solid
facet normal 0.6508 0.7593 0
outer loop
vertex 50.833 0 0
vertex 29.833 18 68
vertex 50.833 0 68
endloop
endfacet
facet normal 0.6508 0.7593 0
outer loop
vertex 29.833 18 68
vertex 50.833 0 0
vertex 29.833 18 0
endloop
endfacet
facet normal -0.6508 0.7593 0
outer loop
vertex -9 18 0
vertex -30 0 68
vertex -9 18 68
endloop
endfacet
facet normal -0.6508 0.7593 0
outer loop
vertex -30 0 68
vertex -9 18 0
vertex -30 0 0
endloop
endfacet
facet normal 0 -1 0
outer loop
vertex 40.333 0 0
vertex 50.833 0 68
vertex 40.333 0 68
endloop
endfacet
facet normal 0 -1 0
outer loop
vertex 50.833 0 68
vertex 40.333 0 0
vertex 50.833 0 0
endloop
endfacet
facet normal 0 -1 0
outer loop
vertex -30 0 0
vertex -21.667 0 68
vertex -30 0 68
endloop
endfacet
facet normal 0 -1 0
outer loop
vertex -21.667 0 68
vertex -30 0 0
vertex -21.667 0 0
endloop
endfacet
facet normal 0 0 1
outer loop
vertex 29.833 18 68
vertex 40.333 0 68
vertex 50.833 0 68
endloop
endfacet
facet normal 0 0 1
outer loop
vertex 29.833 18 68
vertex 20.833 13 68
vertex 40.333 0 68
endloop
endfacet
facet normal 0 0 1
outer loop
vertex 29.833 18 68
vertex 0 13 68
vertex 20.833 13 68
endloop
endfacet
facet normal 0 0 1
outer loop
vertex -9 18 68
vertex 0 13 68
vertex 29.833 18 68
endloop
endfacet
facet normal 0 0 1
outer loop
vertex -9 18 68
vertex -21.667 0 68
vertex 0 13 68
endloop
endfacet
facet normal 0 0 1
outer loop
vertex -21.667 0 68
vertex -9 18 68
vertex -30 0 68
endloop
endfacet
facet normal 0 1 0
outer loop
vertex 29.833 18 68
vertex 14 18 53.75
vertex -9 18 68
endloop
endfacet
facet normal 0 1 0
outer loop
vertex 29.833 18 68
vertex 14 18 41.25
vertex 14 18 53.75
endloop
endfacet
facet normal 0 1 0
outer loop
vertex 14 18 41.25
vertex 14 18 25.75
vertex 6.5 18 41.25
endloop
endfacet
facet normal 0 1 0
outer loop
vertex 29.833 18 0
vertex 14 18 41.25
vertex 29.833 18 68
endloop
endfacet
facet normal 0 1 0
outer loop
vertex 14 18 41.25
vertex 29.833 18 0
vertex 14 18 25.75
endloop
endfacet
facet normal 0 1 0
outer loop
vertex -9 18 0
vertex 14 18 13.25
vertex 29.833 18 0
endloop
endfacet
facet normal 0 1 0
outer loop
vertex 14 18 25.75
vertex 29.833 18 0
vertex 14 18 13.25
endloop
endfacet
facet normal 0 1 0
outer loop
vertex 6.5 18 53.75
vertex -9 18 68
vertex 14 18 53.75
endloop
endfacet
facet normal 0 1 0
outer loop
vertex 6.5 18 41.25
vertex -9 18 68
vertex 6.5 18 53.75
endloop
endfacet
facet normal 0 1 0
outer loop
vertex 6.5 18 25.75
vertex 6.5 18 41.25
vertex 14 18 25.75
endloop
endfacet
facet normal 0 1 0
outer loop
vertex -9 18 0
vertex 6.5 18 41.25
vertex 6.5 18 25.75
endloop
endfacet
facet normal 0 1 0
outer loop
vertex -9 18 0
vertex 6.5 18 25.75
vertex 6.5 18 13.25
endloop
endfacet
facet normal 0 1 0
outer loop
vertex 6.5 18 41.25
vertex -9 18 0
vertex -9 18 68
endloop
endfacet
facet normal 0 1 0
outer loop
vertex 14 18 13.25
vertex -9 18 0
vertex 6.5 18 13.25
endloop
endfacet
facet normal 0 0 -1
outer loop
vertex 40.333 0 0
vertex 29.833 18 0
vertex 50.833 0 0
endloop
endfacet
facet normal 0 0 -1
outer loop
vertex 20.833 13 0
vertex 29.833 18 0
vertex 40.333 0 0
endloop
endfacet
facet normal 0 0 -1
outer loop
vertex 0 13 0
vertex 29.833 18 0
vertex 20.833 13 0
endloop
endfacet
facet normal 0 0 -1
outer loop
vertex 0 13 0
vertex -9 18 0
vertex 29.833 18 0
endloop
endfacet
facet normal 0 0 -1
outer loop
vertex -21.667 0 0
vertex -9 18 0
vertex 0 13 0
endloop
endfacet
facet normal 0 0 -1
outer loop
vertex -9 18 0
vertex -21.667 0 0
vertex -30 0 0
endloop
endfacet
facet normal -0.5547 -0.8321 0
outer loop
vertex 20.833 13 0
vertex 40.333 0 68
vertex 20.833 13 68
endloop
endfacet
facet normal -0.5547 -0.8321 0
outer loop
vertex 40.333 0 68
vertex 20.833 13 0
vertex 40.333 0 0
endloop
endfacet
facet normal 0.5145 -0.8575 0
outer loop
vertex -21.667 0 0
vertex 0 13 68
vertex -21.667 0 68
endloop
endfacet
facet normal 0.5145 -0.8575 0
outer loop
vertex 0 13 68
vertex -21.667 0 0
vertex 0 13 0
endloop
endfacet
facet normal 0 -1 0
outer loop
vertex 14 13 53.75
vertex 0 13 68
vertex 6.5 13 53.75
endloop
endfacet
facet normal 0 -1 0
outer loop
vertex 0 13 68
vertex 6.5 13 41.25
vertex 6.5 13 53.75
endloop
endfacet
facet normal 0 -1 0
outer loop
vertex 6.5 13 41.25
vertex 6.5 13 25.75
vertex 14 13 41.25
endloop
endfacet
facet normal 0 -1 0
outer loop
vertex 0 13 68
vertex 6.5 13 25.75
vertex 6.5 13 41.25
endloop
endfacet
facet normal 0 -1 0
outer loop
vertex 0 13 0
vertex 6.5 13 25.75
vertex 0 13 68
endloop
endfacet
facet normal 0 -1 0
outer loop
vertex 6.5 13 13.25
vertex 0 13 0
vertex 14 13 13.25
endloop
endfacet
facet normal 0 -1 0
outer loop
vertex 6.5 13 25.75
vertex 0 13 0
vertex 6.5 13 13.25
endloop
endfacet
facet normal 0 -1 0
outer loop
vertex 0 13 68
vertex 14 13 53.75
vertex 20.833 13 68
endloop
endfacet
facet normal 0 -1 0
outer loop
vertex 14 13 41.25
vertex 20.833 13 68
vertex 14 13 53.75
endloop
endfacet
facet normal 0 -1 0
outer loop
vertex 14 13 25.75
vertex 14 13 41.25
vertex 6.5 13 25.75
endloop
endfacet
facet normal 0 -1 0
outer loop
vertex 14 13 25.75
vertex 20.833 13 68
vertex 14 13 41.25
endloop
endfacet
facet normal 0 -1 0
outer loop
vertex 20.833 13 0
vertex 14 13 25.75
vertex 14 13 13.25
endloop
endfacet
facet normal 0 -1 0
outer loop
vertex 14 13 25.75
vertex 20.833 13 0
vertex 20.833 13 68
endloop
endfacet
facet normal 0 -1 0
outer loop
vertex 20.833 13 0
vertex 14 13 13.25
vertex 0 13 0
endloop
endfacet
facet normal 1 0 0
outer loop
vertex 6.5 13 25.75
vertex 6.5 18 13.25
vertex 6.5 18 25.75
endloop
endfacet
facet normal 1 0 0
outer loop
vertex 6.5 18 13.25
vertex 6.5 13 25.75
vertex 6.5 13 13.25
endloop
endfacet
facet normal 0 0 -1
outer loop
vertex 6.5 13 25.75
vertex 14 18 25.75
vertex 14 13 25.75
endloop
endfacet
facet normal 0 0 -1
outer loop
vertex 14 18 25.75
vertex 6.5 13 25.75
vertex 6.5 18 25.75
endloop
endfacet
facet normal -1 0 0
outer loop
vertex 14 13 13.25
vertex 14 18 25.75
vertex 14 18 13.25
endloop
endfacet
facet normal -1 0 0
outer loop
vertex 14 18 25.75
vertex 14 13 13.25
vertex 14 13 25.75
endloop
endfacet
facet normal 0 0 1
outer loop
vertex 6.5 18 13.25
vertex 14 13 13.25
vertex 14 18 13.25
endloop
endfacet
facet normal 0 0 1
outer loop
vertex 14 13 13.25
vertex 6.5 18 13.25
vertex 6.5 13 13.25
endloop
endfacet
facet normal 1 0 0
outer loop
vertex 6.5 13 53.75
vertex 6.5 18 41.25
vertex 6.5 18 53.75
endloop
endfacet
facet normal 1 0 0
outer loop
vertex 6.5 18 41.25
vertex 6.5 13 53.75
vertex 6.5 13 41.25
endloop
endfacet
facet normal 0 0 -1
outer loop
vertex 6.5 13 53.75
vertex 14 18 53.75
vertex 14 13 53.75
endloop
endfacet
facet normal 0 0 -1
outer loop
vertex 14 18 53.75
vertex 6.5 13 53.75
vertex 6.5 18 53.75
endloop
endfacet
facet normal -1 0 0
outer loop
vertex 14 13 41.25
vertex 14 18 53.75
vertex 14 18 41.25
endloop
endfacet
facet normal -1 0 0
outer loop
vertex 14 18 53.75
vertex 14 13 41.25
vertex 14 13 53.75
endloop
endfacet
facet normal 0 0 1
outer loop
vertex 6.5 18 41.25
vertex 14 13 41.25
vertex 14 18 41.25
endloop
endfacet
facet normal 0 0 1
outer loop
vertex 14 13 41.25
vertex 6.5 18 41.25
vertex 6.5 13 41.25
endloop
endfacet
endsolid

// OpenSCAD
// file: config.scad
HEX_WIDTH= 125;
HEX_BORDER = 7;
HEX_HEIGHT = 38;
HEX_ARM = HEX_WIDTH / 6;
SHIELD_THICKNESS = 3;
SHIELD_DIFFUSER_PADDING = 3.4;

SNAPFIT_DEPTH = 12.5;
SNAPFIT_HEIGHT = 7.5;
// main file
include <config.scad>;

BASE = 30;
HEIGHT = 18;
SURFACE_PADDING = 9;
WIDTH = 68;

module snapfit_xtor() {
    hole_width = SNAPFIT_DEPTH;
    hole_height = SNAPFIT_HEIGHT;
    dist_y = 14;
    
    rotate([0,90,0])
    translate([-(WIDTH+10)/4, 0, dist_y - hole_height])
    union() {
        linear_extrude(hole_height)
        square([hole_width, 200], center=true);
    }
}

difference() {   
    linear_extrude(WIDTH)
    polygon([
        [-BASE,0],
        [HEX_ARM+BASE, 0],
        [HEX_ARM+SURFACE_PADDING, HEIGHT],
        [-SURFACE_PADDING, HEIGHT],
        [-BASE,0]
    ]);
    
    translate([0,-5,0])
    linear_extrude(70)
    polygon([
        [-BASE+4,0],
        [HEX_ARM+BASE-3, 0],
        [HEX_ARM, HEIGHT],
        [0, HEIGHT],
        [-BASE,0]
    ]);
    
    
    snapfit_xtor();

    translate([0,0,28])
    snapfit_xtor();
}
